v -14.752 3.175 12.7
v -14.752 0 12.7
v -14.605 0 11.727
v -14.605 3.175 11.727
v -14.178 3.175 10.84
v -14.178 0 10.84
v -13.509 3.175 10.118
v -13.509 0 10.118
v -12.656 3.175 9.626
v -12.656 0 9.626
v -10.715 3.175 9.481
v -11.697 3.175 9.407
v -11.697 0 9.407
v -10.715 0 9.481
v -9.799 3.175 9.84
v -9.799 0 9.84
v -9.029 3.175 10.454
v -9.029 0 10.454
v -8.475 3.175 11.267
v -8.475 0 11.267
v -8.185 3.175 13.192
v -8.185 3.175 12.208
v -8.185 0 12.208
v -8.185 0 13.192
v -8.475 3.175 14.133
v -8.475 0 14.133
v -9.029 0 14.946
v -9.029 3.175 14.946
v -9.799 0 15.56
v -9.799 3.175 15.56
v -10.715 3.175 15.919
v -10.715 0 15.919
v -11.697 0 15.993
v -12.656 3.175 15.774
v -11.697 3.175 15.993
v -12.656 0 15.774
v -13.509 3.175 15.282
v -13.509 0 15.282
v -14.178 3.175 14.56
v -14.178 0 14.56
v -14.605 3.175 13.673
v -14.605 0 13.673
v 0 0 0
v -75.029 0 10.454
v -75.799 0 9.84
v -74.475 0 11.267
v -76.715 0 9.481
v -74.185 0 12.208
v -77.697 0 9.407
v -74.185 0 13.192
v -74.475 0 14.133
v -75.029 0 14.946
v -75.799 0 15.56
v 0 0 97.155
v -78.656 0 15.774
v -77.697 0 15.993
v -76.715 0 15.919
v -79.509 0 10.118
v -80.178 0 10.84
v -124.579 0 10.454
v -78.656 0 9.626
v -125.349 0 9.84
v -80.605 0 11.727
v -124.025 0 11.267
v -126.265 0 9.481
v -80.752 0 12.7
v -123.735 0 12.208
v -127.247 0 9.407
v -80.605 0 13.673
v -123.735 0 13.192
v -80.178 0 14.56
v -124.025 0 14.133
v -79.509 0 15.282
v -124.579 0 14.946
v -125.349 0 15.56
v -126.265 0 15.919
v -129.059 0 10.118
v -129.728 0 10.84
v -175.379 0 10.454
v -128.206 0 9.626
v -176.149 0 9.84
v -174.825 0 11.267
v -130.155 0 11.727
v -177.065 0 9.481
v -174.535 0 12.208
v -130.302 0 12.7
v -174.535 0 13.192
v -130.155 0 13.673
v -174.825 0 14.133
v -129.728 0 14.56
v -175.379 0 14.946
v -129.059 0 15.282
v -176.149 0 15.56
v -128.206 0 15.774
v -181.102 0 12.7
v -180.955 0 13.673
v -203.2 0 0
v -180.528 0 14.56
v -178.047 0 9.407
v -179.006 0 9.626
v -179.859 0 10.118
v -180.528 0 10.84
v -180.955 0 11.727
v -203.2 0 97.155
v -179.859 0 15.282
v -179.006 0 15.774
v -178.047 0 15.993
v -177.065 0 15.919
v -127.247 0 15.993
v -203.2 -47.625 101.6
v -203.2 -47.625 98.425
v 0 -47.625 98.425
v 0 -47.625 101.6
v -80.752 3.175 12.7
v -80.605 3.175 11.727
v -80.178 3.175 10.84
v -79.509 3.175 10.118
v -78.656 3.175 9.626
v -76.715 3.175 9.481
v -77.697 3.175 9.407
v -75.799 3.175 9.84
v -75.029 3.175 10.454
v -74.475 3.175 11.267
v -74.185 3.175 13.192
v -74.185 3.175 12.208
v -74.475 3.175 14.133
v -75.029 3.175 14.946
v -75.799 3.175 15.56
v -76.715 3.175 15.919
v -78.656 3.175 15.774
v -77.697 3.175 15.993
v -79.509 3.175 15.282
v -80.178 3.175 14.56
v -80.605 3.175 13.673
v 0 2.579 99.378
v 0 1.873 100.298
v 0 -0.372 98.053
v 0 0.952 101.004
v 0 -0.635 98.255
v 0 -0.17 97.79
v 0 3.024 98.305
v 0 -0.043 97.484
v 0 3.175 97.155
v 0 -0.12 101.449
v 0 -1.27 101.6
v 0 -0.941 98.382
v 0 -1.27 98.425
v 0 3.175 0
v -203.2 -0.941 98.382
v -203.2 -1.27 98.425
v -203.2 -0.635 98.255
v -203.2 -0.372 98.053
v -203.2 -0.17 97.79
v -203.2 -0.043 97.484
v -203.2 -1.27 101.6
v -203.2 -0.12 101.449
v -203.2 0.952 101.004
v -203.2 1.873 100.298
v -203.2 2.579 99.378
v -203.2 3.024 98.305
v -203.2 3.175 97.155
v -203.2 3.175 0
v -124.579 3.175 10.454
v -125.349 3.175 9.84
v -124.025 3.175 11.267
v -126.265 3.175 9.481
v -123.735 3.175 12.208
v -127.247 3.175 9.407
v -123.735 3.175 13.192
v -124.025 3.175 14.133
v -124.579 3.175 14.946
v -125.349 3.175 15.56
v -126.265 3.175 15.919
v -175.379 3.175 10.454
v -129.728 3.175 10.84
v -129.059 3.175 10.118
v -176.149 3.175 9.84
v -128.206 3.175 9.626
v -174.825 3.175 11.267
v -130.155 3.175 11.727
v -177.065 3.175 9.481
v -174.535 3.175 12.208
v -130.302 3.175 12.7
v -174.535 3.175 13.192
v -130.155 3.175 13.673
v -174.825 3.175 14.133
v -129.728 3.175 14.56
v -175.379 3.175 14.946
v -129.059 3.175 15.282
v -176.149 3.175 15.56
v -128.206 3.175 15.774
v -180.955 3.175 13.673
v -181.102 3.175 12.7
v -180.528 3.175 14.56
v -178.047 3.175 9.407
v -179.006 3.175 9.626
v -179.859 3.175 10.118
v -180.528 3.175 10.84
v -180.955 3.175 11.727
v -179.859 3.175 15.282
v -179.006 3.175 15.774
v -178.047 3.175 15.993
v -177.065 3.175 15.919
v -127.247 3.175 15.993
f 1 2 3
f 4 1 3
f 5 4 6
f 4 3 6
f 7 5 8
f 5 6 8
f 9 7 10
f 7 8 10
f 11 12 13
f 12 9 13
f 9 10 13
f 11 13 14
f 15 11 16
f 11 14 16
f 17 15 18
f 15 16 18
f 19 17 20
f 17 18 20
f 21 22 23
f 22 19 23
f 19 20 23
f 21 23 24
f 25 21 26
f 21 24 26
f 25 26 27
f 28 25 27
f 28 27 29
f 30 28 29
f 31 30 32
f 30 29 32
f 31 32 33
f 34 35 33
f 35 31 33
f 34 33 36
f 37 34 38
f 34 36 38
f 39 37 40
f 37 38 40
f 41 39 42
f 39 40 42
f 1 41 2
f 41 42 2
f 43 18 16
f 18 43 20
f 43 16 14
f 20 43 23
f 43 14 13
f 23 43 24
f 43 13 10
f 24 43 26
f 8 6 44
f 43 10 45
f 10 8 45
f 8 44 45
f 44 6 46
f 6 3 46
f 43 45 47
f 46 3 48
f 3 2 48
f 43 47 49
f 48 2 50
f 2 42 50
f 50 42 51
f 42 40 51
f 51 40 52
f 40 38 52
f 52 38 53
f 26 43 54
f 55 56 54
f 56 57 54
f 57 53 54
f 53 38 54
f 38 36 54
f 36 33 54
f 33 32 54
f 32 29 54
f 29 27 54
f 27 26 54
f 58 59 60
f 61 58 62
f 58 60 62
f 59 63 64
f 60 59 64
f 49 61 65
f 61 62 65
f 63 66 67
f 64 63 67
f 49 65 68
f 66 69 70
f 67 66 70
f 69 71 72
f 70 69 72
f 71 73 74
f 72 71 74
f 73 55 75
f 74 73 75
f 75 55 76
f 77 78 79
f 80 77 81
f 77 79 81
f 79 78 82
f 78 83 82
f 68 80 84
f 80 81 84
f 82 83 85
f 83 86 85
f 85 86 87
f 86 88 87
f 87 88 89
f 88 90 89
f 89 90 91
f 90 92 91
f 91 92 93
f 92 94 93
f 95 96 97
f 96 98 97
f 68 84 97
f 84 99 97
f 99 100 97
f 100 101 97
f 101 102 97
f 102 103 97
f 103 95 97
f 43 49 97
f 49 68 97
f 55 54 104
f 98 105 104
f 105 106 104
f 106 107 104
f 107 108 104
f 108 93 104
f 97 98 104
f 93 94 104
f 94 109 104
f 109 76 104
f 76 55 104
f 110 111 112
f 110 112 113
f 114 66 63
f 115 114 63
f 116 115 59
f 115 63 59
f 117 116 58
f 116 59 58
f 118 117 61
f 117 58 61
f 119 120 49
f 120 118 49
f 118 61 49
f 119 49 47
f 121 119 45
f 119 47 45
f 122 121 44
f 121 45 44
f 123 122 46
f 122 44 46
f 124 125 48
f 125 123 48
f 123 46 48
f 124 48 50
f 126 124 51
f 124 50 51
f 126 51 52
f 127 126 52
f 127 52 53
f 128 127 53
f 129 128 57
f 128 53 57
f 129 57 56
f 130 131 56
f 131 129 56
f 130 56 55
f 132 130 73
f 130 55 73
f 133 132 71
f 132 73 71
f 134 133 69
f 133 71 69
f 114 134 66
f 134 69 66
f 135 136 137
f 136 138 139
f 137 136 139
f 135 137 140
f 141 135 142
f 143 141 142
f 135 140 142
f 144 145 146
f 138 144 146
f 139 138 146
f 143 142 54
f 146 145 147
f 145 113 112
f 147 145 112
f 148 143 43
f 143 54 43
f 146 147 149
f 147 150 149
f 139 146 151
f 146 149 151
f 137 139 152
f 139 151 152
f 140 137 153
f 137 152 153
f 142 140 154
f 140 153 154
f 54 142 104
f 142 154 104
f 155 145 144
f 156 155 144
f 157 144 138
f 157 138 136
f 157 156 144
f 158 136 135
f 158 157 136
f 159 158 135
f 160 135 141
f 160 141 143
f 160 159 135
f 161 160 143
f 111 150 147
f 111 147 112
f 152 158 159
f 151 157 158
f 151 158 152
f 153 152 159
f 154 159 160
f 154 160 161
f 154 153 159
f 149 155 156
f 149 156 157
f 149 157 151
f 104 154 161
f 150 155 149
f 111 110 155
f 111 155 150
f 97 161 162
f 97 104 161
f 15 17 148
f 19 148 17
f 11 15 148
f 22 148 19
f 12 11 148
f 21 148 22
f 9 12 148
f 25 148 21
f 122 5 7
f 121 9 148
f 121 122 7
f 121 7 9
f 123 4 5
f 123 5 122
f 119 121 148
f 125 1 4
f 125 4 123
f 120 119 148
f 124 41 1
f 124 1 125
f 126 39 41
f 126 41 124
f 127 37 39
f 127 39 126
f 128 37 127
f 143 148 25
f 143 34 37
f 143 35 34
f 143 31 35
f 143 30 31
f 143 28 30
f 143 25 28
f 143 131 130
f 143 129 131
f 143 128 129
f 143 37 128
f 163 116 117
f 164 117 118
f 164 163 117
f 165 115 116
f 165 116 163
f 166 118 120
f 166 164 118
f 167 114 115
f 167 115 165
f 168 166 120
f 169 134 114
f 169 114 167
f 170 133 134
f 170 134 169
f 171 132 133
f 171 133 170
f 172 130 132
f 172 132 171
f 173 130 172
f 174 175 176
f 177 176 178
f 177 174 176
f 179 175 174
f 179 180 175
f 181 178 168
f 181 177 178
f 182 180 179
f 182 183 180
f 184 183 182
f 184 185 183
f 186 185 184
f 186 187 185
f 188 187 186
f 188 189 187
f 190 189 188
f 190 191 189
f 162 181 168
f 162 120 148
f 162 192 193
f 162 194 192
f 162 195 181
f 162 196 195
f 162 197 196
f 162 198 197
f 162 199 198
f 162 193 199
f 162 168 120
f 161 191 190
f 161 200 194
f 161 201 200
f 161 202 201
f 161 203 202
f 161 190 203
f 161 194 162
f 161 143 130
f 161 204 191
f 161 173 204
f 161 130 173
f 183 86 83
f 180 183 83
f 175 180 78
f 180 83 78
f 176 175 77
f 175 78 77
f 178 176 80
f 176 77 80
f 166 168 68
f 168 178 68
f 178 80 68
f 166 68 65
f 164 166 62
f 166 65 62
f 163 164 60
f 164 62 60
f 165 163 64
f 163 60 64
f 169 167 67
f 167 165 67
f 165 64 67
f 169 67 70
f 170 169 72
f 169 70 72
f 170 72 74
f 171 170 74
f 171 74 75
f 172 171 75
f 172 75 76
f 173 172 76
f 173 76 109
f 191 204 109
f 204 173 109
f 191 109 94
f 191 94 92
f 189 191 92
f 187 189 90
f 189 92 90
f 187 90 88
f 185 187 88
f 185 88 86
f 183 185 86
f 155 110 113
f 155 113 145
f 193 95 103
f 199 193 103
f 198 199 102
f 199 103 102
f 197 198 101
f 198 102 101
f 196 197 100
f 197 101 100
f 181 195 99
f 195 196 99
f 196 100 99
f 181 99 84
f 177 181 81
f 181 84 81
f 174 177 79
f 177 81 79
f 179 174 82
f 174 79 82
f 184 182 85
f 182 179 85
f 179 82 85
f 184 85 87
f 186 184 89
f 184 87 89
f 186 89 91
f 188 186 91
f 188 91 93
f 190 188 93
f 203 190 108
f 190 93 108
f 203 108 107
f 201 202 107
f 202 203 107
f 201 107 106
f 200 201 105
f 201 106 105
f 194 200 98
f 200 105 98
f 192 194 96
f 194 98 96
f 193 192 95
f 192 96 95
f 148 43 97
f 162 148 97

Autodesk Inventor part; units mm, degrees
ref_plane "YZ Plane" through (0, 0, 0) normal (1, 0, 0) x (0, 1, 0)
ref_plane "XZ Plane" through (0, 0, 0) normal (0, 1, 0) x (-1, 0, 0)
ref_plane "XY Plane" through (0, 0, 0) normal (0, 0, 1) x (1, 0, 0)
sketch "Sketch1" plane through (0, 0, 0) normal (0, 1, 0) x (-1, 0, 0)
  line L0 (0, 0) -> (203.2, 0)
  line L1 (203.2, 0) -> (203.2, 25.4)
  line L2 (203.2, 25.4) -> (0, 25.4) construction
  line L3 (0, 25.4) -> (0, 0)
  line L4 (11.45, 12.7) -> (77.45, 12.7) construction
  circle A0 centre (11.45, 12.7) radius 3.302
  circle A1 centre (77.45, 12.7) radius 3.302
  line L5 (44.45, 25.4) -> (44.45, 0) construction
  circle A2 centre (127, 12.7) radius 3.302
  circle A3 centre (177.8, 12.7) radius 3.302
  line L6 (127, 12.7) -> (177.8, 12.7) construction
  line L7 (152.4, 25.4) -> (152.4, 0) construction
  line L8 (0, 25.4) -> (0, 101.6)
  line L9 (0, 101.6) -> (203.2, 101.6)
  line L10 (203.2, 101.6) -> (203.2, 25.4)
  point P0 (44.45, 12.7)
  point P1 (152.4, 12.7)
  dimension "d0" = 66
  dimension "d1" = 6.604
  dimension "d2" = 6.604
  dimension "d3" = 25.4
  dimension "d4" = 44.45
  dimension "d6" = 50.8
  dimension "d7" = 50.8
  dimension "d8" = 76.2
  dimension "d9" = 203.2
extrude "Plate1" add sketch "Sketch1" along normal blind 3.175
sketch "Sketch2" plane through (-203.2, 3.175, 98.425) normal (0, 0, 1) x (1, 0, 0)
  line L0 (203.2, 0) -> (0, 0)
  line L1 (0, 0) -> (0, -50.8)
  line L2 (0, -50.8) -> (203.2, -50.8)
  line L3 (203.2, -50.8) -> (203.2, 0)
edge flange "Flange1" height 50.8 angle 90 thickness 3.175 bend radius 1.27 thickness toward (0, 0, 1) relief tear relief width 3.175 relief depth 1.5875 edges at (-101.6, 0, 101.6) wall of the first edge with corners at (0, 3.175, 98.425) (-203.2, 3.175, 98.425) (-203.2, -47.625, 98.425) (0, -47.625, 98.425)
bend "Bend1"
corner "Corner1"
equation "\"d11\" = BendReliefWidth"
equation "\"d12\" = BendReliefDepth"
equation "\"d13\" = MinimumRemnant"
equation "\"d14\" = BendRadius"
equation "\"d18\" = CornerReliefSize"
equation "\"d19\" = GapSize"
equation "\"d20\" = JacobiRadiusSize"
equation "\"BendRadius\" = Thickness"
equation "\"BendReliefWidth\" = Thickness"
equation "\"BendReliefDepth\" = 0.5 * Thickness"
equation "\"CornerReliefSize\" = 4 * Thickness"
equation "\"MinimumRemnant\" = 2 * Thickness"
equation "\"TransitionRadius\" = BendRadius"
equation "\"JacobiRadiusSize\" = BendRadius"
equation "\"GapSize\" = Thickness"
equation "\"d10\" = BendRadius"
equation "\"Thickness\" = 3.175"
properties part number "Electrical Board Mount Part1" material "Aluminum 6061"
